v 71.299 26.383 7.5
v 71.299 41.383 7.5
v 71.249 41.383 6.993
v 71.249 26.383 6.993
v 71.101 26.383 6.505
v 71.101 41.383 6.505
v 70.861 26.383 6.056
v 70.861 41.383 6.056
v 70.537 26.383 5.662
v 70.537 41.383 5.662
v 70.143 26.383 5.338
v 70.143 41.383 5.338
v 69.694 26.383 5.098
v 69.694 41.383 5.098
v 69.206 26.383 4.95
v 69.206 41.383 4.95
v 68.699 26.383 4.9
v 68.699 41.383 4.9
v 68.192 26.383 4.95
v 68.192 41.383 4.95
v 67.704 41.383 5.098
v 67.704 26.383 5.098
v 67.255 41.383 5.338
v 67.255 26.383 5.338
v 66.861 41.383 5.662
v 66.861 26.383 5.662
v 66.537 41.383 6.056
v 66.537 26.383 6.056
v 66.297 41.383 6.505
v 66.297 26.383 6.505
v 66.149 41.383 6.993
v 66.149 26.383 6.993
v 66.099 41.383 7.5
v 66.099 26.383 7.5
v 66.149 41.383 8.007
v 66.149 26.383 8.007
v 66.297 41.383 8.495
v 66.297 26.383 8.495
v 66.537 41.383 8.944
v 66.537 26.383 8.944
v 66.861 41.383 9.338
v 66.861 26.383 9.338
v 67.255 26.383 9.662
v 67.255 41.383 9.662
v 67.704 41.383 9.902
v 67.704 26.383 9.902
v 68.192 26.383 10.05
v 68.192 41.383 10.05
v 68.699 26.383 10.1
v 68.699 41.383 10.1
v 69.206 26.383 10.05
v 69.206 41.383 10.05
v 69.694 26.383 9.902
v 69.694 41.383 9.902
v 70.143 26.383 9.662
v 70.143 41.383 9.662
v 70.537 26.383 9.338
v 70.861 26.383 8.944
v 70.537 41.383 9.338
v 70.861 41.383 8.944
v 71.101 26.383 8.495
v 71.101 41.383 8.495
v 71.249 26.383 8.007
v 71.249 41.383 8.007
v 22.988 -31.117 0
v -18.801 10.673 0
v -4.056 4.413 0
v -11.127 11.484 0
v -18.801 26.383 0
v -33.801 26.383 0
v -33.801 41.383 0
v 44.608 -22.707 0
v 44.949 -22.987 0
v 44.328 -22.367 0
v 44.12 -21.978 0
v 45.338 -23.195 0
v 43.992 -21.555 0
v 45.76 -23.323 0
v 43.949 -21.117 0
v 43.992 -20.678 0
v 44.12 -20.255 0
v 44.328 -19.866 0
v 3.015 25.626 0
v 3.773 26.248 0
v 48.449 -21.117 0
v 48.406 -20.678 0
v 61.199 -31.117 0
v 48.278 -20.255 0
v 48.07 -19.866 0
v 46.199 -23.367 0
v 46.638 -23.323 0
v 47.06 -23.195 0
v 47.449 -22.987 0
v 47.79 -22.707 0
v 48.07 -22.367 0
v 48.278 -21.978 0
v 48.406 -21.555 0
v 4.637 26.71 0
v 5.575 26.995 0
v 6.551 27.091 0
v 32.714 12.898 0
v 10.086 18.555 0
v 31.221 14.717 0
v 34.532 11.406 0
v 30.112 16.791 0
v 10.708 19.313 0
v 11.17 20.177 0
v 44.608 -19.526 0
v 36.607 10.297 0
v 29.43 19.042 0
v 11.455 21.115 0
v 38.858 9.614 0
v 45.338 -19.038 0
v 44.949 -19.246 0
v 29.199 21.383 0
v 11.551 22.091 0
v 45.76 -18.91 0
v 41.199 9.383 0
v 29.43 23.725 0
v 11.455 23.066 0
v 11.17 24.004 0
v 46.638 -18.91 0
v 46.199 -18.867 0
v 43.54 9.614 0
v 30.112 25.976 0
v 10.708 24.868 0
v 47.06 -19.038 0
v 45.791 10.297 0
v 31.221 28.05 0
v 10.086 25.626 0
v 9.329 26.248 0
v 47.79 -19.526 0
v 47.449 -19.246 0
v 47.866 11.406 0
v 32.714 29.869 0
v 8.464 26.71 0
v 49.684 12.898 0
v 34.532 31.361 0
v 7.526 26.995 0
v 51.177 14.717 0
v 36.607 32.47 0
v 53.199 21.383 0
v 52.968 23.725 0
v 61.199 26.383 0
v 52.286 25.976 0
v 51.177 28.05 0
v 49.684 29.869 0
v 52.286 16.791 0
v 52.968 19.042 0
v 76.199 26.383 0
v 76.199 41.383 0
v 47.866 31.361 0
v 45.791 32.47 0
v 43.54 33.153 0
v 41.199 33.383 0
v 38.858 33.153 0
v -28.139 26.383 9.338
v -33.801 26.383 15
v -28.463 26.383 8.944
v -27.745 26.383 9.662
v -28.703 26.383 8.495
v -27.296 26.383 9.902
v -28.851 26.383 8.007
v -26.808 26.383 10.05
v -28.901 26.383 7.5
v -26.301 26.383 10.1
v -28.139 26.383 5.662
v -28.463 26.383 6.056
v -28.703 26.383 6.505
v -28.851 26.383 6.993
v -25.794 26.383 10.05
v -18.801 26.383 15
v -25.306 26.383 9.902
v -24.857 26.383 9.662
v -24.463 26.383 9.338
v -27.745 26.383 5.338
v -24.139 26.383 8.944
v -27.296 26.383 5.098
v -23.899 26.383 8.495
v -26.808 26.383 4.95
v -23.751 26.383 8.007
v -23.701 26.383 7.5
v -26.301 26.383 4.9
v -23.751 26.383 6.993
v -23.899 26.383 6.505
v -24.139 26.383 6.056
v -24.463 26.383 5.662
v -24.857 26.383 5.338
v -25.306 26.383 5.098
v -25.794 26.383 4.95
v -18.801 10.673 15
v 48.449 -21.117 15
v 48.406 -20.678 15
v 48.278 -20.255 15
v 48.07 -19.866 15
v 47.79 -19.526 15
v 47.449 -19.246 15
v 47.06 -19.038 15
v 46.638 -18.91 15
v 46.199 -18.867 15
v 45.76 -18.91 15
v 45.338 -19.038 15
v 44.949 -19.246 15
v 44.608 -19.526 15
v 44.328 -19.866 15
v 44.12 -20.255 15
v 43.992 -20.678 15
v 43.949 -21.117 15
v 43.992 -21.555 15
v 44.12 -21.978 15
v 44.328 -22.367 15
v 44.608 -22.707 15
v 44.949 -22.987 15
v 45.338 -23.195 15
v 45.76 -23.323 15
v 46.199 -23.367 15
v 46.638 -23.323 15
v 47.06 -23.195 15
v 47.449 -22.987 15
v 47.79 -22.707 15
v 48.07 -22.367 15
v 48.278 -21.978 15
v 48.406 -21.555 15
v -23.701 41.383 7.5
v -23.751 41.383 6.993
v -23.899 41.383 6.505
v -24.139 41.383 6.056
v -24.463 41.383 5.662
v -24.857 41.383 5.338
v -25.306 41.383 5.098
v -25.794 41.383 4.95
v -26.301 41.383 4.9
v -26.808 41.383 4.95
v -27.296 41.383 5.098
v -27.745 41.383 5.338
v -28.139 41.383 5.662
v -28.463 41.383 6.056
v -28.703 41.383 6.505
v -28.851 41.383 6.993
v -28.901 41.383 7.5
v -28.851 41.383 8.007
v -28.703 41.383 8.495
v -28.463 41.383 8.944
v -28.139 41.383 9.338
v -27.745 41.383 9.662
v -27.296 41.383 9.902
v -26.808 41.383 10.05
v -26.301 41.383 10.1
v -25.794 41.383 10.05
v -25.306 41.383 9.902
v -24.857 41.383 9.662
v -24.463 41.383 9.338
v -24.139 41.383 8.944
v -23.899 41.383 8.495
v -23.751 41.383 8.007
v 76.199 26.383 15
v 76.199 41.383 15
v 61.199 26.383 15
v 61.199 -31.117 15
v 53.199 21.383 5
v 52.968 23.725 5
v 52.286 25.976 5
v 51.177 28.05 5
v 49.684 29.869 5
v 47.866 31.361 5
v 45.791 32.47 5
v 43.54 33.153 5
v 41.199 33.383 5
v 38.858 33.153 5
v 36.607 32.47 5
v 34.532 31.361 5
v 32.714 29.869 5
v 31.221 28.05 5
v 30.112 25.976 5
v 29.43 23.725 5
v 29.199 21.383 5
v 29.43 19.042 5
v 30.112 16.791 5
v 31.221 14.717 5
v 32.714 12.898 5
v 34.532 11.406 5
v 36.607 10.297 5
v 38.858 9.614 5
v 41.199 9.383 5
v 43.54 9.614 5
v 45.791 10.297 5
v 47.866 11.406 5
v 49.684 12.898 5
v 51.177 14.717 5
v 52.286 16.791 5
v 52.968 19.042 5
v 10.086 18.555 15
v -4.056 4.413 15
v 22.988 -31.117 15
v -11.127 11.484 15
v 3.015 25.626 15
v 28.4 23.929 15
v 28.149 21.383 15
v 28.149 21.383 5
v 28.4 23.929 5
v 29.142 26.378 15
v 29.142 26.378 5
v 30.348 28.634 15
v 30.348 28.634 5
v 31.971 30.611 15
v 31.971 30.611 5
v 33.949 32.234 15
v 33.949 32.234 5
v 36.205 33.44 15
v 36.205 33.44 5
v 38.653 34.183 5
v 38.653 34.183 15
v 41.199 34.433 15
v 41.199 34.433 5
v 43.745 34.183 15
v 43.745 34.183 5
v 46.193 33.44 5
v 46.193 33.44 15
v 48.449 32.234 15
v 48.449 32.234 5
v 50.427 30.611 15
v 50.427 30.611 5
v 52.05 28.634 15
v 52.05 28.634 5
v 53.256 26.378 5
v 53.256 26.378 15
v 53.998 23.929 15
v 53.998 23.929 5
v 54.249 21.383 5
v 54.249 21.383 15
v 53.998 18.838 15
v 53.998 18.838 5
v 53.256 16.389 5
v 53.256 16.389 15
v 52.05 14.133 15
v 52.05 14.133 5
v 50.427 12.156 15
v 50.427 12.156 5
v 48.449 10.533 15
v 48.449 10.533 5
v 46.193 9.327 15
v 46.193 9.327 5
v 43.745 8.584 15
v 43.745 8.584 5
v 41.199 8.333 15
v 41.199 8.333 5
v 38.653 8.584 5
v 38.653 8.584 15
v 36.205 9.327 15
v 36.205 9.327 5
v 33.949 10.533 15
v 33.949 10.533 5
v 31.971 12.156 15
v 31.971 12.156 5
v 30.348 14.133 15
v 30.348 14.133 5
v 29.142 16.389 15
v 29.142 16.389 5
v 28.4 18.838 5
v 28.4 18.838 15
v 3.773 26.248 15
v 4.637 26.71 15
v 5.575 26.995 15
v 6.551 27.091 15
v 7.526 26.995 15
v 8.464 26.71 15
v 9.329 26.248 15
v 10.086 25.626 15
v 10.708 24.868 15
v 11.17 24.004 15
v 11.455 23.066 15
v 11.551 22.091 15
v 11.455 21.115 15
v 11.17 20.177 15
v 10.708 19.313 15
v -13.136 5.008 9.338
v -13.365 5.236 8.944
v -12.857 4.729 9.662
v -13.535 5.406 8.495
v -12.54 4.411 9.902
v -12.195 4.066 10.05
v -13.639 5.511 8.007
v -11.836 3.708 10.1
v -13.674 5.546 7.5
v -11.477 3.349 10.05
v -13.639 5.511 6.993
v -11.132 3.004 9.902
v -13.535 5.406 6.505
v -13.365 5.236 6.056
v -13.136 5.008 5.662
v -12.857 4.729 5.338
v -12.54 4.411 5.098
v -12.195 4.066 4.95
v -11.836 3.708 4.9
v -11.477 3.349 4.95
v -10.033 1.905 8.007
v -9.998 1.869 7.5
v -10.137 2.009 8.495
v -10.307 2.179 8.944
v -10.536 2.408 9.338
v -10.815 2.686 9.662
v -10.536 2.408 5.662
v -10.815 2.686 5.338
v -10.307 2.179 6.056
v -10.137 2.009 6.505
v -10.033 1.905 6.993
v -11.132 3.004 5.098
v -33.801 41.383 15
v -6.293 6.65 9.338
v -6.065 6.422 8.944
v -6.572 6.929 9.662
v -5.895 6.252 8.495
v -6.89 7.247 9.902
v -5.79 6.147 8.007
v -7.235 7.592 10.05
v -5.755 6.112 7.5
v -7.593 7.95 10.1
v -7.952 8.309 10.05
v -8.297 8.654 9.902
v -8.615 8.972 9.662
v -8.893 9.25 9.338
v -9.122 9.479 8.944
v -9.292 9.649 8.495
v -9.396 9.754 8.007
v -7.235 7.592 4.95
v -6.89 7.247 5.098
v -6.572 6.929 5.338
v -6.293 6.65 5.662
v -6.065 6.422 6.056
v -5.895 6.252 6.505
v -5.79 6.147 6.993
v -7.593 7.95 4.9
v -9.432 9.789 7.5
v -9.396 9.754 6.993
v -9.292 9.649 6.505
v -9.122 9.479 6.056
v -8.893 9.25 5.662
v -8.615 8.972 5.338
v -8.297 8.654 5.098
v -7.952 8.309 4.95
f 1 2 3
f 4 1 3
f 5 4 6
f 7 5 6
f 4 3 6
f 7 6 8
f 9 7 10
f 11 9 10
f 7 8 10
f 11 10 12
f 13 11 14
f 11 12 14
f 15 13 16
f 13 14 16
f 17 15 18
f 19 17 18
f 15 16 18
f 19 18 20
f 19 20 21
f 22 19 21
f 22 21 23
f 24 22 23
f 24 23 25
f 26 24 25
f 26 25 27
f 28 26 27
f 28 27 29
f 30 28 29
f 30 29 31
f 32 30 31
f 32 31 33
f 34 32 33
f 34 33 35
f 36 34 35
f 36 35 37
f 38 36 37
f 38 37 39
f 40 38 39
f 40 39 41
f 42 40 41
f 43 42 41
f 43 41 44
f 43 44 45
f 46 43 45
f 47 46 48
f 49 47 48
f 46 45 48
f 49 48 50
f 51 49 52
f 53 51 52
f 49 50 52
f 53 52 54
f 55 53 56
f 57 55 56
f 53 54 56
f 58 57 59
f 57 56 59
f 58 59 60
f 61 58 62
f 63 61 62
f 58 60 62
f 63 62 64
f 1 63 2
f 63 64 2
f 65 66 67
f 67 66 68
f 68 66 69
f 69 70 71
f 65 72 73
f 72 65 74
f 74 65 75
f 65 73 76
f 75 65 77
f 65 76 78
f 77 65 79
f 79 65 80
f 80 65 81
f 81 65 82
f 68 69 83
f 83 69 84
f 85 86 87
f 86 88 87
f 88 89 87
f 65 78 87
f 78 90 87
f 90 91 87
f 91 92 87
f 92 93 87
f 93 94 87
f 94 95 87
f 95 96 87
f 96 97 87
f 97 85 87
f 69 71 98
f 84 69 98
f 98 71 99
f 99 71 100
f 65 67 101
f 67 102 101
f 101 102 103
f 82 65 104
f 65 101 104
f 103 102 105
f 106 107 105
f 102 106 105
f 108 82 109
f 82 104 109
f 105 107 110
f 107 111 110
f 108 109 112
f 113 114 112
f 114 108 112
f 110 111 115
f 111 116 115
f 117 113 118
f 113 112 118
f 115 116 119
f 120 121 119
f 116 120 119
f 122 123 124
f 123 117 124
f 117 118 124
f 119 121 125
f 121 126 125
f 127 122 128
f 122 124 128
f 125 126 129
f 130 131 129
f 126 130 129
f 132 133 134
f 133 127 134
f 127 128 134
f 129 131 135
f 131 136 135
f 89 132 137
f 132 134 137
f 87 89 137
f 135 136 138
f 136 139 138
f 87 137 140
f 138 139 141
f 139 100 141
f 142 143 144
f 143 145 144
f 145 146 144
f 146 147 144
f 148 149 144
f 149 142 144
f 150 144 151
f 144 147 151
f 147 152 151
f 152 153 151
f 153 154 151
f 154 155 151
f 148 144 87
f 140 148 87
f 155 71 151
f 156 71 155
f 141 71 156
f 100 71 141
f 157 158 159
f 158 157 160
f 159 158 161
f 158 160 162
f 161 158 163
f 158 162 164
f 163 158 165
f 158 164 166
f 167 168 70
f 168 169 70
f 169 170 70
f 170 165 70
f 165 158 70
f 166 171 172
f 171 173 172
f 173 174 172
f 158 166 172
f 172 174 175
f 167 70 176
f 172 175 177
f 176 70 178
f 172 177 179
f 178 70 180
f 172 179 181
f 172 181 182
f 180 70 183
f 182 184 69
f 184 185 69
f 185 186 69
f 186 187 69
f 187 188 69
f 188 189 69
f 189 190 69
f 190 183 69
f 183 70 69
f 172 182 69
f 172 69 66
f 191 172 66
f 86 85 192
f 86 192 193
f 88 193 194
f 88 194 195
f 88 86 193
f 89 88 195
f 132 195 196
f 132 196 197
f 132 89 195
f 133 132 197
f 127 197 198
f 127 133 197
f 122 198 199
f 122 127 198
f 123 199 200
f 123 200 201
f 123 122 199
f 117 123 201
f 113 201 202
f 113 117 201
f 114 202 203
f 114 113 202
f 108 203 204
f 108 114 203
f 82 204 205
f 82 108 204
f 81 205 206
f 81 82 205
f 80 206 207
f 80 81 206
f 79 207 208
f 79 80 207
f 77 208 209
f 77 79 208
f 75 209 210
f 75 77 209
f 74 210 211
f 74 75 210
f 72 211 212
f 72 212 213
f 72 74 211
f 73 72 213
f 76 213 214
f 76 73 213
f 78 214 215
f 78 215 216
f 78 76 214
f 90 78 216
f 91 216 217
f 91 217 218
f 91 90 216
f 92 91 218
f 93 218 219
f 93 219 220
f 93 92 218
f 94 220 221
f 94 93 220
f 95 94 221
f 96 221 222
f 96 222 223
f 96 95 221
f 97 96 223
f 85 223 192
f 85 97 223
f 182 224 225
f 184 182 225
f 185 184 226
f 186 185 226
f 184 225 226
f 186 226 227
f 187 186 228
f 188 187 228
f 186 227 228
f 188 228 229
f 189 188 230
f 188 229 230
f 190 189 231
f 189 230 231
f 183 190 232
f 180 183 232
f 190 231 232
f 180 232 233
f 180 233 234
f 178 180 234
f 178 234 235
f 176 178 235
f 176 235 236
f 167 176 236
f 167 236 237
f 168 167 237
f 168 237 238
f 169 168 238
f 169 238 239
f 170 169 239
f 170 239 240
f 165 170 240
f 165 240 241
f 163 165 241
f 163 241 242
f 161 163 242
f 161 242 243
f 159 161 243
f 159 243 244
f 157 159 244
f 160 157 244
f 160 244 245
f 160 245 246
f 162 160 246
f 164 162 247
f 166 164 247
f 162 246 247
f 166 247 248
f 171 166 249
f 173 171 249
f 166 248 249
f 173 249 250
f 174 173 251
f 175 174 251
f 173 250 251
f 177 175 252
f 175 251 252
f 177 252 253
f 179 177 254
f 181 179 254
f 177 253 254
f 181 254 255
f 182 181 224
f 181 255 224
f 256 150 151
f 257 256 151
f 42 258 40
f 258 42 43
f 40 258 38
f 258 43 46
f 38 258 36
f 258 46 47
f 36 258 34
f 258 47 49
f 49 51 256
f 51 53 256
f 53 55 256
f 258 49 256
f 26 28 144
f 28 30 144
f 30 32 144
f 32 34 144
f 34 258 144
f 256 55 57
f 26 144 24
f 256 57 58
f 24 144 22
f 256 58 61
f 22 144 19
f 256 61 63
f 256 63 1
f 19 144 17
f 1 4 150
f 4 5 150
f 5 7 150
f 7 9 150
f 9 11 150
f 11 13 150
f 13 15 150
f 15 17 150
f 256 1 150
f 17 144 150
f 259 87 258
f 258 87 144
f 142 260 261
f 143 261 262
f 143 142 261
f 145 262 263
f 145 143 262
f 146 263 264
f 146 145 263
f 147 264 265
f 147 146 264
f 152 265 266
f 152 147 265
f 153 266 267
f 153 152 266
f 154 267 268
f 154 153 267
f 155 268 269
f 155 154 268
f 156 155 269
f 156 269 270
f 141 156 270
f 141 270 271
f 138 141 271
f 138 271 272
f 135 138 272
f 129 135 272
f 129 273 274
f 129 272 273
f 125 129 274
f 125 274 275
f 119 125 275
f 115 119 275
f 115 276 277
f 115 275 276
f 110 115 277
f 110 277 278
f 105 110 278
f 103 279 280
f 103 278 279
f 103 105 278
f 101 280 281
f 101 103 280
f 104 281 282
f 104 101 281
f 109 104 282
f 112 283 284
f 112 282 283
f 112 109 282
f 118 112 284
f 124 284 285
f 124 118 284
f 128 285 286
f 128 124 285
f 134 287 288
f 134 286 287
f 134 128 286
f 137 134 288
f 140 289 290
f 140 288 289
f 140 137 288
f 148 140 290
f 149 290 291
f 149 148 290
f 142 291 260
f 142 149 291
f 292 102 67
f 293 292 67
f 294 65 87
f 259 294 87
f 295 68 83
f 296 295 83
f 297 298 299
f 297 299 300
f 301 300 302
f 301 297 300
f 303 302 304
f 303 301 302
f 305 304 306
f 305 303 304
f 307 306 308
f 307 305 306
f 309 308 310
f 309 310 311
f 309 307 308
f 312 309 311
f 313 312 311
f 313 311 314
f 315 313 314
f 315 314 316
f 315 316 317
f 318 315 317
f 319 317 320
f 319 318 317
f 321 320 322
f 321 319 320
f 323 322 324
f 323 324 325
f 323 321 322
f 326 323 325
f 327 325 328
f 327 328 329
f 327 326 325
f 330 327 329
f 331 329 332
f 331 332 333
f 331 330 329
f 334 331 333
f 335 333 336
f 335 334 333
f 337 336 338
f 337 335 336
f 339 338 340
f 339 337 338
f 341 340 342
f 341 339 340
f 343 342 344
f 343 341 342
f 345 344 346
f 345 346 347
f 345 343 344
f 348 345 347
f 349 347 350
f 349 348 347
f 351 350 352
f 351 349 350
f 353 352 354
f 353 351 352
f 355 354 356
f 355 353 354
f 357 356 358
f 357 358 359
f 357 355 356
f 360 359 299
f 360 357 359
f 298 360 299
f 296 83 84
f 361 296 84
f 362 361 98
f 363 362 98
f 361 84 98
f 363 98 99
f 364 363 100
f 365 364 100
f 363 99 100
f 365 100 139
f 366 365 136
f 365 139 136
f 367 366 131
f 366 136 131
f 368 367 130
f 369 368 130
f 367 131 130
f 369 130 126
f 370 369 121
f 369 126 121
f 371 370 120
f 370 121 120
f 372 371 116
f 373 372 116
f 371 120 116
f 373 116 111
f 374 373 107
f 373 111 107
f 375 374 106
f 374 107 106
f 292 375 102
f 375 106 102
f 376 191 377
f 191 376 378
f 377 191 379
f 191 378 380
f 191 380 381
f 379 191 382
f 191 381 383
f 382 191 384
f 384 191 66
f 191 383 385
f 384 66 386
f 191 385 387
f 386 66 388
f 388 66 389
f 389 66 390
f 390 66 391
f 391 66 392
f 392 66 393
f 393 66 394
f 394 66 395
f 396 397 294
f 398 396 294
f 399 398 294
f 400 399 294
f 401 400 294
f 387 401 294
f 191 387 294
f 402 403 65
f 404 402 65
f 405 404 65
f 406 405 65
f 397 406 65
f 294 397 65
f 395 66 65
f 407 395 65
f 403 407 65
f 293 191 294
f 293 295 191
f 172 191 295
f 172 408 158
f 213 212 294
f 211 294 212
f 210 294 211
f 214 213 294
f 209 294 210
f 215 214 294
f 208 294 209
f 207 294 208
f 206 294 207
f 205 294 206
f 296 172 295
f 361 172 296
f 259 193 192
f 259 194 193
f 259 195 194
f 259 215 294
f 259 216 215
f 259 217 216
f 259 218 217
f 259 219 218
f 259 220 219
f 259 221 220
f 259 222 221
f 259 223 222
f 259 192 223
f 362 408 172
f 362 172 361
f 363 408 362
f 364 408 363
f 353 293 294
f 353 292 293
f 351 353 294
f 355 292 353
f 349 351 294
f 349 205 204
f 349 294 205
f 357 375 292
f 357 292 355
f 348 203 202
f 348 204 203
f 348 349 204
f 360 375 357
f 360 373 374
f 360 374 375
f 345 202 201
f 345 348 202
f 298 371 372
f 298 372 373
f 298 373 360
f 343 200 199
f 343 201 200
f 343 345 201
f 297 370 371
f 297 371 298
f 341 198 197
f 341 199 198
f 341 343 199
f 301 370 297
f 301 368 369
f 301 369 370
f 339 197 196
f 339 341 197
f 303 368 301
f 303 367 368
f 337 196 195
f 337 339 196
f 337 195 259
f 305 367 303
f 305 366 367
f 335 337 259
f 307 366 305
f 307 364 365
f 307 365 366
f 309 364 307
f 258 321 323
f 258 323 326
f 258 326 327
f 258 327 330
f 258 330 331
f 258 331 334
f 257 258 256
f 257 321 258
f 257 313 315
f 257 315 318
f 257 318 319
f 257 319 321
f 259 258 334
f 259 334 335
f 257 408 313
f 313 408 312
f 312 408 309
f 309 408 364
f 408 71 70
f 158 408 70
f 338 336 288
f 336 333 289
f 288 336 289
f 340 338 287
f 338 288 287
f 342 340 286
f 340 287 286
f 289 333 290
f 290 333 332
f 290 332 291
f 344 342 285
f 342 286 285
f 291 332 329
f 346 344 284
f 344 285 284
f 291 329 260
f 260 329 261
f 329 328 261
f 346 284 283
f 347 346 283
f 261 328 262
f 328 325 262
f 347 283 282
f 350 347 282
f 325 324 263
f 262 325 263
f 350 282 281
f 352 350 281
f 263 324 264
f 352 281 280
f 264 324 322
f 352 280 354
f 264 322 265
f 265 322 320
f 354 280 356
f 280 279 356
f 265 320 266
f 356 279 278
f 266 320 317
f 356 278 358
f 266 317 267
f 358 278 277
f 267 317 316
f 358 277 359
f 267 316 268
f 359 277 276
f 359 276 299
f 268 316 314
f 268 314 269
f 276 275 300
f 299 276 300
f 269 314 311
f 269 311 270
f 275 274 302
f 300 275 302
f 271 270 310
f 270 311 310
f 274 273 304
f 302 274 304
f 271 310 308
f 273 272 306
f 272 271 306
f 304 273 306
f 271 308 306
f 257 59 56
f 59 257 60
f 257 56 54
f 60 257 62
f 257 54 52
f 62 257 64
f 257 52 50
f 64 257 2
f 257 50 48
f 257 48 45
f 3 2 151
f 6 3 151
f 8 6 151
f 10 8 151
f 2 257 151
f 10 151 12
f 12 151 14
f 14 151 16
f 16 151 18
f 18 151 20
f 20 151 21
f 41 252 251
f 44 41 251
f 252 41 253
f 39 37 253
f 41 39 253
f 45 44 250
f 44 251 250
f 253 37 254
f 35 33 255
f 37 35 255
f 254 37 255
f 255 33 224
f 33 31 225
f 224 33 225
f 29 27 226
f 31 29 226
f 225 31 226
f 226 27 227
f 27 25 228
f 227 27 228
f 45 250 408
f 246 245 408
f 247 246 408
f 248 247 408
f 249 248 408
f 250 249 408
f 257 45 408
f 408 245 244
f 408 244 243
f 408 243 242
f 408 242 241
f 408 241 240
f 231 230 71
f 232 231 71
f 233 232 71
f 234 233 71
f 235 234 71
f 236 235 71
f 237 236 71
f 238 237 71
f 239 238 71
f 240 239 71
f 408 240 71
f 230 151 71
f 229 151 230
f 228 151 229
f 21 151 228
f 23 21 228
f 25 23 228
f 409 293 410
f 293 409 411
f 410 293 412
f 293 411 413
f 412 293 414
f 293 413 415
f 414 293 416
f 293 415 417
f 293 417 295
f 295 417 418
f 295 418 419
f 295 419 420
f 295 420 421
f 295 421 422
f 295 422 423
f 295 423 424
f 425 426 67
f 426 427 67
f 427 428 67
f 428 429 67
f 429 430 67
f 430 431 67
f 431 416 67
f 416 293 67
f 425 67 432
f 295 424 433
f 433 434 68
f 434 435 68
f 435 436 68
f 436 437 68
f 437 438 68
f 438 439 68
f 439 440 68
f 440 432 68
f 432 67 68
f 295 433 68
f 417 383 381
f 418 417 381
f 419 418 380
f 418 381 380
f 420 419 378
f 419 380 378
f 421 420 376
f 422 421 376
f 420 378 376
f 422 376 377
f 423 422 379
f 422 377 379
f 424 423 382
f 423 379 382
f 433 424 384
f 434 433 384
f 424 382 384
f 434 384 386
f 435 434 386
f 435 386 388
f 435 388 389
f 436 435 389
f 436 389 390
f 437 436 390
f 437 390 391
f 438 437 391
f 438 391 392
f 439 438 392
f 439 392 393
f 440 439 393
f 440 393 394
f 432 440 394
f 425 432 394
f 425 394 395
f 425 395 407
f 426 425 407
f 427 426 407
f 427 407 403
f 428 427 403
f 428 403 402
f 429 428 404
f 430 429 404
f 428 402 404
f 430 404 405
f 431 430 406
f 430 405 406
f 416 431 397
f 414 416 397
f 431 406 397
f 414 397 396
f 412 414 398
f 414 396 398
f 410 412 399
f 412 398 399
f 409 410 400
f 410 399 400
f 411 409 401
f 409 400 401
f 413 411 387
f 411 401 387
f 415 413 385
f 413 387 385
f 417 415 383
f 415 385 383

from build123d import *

# Parameters (mm, degrees)
SKETCH_1_R          = 12
SKETCH_1_R_2        = 2.25
EXTRUDE_1_DEPTH     = 15
SKETCH_2_R          = 13.05
CUT_EXTRUDE_1_DEPTH = 10
SKETCH_3_R          = 2.6
CUT_EXTRUDE_2_DEPTH = 73.5
SKETCH_5_R          = 2.6
CUT_EXTRUDE_3_DEPTH = 10


with BuildPart() as part:
    # 草图1 → 凸台-拉伸1 (new body)
    with BuildSketch(Plane.XY):
        Polygon((-33.800989673, 26.383498279), (-27.44059998, 26.383498279), (-18.800989673, 26.383498279), (-18.800989673, 10.67282016), (22.988332208, -31.116501721), (61.199010327, -31.116501721), (61.199010327, 26.383498279), (76.199010327, 26.383498279), (76.199010327, 41.383498279), (56.199010327, 41.383498279), (-33.800989673, 41.383498279), align=None)
        with Locations((41.199010327, 21.383498279)):
            Circle(SKETCH_1_R, mode=Mode.SUBTRACT)
        with Locations((46.199010327, -21.116501721)):
            Circle(SKETCH_1_R_2, mode=Mode.SUBTRACT)
        with BuildLine():
            Line((-11.126891481, 11.484003342), (3.015244143, 25.626138966))
            ThreePointArc((3.015244143, 25.626138966), (10.086311955, 25.626138966), (10.086311955, 18.555071154))
            Line((10.086311955, 18.555071154), (-4.055823669, 4.41293553))
            Line((-4.055823669, 4.41293553), (-11.126891481, 11.484003342))
        make_face(mode=Mode.SUBTRACT)
    extrude(amount=EXTRUDE_1_DEPTH)

    # 草图2 → 切除-拉伸1 (cut)
    with BuildSketch(Plane(origin=(0, 0, 15), x_dir=(-1, 0, 0), z_dir=(0, 0, -1))):
        with Locations((-41.199010327, 21.383498279)):
            Circle(SKETCH_2_R)
    extrude(amount=CUT_EXTRUDE_1_DEPTH, mode=Mode.SUBTRACT)

    # 草图3 → 切除-拉伸2 (cut, through all)
    with BuildSketch(Plane(origin=(0, 41.383498279, 0), x_dir=(1, 0, 0), z_dir=(0, 1, 0))):
        with Locations((-26.300989673, -7.5)):
            Circle(SKETCH_3_R)
        with Locations((68.699010327, -7.5)):
            Circle(SKETCH_3_R)
    extrude(amount=-CUT_EXTRUDE_2_DEPTH, mode=Mode.SUBTRACT)

    # 草图5 → 切除-拉伸3 (cut)
    with BuildSketch(Plane(origin=(-4.064084756, -4.064084756, 0), x_dir=(0, 0, 1), z_dir=(-0.707106781, -0.707106781, 0))):
        with Locations((7.5, 10.9911308)):
            Circle(SKETCH_5_R)
    extrude(amount=-CUT_EXTRUDE_3_DEPTH, mode=Mode.SUBTRACT)


solid = part.part
